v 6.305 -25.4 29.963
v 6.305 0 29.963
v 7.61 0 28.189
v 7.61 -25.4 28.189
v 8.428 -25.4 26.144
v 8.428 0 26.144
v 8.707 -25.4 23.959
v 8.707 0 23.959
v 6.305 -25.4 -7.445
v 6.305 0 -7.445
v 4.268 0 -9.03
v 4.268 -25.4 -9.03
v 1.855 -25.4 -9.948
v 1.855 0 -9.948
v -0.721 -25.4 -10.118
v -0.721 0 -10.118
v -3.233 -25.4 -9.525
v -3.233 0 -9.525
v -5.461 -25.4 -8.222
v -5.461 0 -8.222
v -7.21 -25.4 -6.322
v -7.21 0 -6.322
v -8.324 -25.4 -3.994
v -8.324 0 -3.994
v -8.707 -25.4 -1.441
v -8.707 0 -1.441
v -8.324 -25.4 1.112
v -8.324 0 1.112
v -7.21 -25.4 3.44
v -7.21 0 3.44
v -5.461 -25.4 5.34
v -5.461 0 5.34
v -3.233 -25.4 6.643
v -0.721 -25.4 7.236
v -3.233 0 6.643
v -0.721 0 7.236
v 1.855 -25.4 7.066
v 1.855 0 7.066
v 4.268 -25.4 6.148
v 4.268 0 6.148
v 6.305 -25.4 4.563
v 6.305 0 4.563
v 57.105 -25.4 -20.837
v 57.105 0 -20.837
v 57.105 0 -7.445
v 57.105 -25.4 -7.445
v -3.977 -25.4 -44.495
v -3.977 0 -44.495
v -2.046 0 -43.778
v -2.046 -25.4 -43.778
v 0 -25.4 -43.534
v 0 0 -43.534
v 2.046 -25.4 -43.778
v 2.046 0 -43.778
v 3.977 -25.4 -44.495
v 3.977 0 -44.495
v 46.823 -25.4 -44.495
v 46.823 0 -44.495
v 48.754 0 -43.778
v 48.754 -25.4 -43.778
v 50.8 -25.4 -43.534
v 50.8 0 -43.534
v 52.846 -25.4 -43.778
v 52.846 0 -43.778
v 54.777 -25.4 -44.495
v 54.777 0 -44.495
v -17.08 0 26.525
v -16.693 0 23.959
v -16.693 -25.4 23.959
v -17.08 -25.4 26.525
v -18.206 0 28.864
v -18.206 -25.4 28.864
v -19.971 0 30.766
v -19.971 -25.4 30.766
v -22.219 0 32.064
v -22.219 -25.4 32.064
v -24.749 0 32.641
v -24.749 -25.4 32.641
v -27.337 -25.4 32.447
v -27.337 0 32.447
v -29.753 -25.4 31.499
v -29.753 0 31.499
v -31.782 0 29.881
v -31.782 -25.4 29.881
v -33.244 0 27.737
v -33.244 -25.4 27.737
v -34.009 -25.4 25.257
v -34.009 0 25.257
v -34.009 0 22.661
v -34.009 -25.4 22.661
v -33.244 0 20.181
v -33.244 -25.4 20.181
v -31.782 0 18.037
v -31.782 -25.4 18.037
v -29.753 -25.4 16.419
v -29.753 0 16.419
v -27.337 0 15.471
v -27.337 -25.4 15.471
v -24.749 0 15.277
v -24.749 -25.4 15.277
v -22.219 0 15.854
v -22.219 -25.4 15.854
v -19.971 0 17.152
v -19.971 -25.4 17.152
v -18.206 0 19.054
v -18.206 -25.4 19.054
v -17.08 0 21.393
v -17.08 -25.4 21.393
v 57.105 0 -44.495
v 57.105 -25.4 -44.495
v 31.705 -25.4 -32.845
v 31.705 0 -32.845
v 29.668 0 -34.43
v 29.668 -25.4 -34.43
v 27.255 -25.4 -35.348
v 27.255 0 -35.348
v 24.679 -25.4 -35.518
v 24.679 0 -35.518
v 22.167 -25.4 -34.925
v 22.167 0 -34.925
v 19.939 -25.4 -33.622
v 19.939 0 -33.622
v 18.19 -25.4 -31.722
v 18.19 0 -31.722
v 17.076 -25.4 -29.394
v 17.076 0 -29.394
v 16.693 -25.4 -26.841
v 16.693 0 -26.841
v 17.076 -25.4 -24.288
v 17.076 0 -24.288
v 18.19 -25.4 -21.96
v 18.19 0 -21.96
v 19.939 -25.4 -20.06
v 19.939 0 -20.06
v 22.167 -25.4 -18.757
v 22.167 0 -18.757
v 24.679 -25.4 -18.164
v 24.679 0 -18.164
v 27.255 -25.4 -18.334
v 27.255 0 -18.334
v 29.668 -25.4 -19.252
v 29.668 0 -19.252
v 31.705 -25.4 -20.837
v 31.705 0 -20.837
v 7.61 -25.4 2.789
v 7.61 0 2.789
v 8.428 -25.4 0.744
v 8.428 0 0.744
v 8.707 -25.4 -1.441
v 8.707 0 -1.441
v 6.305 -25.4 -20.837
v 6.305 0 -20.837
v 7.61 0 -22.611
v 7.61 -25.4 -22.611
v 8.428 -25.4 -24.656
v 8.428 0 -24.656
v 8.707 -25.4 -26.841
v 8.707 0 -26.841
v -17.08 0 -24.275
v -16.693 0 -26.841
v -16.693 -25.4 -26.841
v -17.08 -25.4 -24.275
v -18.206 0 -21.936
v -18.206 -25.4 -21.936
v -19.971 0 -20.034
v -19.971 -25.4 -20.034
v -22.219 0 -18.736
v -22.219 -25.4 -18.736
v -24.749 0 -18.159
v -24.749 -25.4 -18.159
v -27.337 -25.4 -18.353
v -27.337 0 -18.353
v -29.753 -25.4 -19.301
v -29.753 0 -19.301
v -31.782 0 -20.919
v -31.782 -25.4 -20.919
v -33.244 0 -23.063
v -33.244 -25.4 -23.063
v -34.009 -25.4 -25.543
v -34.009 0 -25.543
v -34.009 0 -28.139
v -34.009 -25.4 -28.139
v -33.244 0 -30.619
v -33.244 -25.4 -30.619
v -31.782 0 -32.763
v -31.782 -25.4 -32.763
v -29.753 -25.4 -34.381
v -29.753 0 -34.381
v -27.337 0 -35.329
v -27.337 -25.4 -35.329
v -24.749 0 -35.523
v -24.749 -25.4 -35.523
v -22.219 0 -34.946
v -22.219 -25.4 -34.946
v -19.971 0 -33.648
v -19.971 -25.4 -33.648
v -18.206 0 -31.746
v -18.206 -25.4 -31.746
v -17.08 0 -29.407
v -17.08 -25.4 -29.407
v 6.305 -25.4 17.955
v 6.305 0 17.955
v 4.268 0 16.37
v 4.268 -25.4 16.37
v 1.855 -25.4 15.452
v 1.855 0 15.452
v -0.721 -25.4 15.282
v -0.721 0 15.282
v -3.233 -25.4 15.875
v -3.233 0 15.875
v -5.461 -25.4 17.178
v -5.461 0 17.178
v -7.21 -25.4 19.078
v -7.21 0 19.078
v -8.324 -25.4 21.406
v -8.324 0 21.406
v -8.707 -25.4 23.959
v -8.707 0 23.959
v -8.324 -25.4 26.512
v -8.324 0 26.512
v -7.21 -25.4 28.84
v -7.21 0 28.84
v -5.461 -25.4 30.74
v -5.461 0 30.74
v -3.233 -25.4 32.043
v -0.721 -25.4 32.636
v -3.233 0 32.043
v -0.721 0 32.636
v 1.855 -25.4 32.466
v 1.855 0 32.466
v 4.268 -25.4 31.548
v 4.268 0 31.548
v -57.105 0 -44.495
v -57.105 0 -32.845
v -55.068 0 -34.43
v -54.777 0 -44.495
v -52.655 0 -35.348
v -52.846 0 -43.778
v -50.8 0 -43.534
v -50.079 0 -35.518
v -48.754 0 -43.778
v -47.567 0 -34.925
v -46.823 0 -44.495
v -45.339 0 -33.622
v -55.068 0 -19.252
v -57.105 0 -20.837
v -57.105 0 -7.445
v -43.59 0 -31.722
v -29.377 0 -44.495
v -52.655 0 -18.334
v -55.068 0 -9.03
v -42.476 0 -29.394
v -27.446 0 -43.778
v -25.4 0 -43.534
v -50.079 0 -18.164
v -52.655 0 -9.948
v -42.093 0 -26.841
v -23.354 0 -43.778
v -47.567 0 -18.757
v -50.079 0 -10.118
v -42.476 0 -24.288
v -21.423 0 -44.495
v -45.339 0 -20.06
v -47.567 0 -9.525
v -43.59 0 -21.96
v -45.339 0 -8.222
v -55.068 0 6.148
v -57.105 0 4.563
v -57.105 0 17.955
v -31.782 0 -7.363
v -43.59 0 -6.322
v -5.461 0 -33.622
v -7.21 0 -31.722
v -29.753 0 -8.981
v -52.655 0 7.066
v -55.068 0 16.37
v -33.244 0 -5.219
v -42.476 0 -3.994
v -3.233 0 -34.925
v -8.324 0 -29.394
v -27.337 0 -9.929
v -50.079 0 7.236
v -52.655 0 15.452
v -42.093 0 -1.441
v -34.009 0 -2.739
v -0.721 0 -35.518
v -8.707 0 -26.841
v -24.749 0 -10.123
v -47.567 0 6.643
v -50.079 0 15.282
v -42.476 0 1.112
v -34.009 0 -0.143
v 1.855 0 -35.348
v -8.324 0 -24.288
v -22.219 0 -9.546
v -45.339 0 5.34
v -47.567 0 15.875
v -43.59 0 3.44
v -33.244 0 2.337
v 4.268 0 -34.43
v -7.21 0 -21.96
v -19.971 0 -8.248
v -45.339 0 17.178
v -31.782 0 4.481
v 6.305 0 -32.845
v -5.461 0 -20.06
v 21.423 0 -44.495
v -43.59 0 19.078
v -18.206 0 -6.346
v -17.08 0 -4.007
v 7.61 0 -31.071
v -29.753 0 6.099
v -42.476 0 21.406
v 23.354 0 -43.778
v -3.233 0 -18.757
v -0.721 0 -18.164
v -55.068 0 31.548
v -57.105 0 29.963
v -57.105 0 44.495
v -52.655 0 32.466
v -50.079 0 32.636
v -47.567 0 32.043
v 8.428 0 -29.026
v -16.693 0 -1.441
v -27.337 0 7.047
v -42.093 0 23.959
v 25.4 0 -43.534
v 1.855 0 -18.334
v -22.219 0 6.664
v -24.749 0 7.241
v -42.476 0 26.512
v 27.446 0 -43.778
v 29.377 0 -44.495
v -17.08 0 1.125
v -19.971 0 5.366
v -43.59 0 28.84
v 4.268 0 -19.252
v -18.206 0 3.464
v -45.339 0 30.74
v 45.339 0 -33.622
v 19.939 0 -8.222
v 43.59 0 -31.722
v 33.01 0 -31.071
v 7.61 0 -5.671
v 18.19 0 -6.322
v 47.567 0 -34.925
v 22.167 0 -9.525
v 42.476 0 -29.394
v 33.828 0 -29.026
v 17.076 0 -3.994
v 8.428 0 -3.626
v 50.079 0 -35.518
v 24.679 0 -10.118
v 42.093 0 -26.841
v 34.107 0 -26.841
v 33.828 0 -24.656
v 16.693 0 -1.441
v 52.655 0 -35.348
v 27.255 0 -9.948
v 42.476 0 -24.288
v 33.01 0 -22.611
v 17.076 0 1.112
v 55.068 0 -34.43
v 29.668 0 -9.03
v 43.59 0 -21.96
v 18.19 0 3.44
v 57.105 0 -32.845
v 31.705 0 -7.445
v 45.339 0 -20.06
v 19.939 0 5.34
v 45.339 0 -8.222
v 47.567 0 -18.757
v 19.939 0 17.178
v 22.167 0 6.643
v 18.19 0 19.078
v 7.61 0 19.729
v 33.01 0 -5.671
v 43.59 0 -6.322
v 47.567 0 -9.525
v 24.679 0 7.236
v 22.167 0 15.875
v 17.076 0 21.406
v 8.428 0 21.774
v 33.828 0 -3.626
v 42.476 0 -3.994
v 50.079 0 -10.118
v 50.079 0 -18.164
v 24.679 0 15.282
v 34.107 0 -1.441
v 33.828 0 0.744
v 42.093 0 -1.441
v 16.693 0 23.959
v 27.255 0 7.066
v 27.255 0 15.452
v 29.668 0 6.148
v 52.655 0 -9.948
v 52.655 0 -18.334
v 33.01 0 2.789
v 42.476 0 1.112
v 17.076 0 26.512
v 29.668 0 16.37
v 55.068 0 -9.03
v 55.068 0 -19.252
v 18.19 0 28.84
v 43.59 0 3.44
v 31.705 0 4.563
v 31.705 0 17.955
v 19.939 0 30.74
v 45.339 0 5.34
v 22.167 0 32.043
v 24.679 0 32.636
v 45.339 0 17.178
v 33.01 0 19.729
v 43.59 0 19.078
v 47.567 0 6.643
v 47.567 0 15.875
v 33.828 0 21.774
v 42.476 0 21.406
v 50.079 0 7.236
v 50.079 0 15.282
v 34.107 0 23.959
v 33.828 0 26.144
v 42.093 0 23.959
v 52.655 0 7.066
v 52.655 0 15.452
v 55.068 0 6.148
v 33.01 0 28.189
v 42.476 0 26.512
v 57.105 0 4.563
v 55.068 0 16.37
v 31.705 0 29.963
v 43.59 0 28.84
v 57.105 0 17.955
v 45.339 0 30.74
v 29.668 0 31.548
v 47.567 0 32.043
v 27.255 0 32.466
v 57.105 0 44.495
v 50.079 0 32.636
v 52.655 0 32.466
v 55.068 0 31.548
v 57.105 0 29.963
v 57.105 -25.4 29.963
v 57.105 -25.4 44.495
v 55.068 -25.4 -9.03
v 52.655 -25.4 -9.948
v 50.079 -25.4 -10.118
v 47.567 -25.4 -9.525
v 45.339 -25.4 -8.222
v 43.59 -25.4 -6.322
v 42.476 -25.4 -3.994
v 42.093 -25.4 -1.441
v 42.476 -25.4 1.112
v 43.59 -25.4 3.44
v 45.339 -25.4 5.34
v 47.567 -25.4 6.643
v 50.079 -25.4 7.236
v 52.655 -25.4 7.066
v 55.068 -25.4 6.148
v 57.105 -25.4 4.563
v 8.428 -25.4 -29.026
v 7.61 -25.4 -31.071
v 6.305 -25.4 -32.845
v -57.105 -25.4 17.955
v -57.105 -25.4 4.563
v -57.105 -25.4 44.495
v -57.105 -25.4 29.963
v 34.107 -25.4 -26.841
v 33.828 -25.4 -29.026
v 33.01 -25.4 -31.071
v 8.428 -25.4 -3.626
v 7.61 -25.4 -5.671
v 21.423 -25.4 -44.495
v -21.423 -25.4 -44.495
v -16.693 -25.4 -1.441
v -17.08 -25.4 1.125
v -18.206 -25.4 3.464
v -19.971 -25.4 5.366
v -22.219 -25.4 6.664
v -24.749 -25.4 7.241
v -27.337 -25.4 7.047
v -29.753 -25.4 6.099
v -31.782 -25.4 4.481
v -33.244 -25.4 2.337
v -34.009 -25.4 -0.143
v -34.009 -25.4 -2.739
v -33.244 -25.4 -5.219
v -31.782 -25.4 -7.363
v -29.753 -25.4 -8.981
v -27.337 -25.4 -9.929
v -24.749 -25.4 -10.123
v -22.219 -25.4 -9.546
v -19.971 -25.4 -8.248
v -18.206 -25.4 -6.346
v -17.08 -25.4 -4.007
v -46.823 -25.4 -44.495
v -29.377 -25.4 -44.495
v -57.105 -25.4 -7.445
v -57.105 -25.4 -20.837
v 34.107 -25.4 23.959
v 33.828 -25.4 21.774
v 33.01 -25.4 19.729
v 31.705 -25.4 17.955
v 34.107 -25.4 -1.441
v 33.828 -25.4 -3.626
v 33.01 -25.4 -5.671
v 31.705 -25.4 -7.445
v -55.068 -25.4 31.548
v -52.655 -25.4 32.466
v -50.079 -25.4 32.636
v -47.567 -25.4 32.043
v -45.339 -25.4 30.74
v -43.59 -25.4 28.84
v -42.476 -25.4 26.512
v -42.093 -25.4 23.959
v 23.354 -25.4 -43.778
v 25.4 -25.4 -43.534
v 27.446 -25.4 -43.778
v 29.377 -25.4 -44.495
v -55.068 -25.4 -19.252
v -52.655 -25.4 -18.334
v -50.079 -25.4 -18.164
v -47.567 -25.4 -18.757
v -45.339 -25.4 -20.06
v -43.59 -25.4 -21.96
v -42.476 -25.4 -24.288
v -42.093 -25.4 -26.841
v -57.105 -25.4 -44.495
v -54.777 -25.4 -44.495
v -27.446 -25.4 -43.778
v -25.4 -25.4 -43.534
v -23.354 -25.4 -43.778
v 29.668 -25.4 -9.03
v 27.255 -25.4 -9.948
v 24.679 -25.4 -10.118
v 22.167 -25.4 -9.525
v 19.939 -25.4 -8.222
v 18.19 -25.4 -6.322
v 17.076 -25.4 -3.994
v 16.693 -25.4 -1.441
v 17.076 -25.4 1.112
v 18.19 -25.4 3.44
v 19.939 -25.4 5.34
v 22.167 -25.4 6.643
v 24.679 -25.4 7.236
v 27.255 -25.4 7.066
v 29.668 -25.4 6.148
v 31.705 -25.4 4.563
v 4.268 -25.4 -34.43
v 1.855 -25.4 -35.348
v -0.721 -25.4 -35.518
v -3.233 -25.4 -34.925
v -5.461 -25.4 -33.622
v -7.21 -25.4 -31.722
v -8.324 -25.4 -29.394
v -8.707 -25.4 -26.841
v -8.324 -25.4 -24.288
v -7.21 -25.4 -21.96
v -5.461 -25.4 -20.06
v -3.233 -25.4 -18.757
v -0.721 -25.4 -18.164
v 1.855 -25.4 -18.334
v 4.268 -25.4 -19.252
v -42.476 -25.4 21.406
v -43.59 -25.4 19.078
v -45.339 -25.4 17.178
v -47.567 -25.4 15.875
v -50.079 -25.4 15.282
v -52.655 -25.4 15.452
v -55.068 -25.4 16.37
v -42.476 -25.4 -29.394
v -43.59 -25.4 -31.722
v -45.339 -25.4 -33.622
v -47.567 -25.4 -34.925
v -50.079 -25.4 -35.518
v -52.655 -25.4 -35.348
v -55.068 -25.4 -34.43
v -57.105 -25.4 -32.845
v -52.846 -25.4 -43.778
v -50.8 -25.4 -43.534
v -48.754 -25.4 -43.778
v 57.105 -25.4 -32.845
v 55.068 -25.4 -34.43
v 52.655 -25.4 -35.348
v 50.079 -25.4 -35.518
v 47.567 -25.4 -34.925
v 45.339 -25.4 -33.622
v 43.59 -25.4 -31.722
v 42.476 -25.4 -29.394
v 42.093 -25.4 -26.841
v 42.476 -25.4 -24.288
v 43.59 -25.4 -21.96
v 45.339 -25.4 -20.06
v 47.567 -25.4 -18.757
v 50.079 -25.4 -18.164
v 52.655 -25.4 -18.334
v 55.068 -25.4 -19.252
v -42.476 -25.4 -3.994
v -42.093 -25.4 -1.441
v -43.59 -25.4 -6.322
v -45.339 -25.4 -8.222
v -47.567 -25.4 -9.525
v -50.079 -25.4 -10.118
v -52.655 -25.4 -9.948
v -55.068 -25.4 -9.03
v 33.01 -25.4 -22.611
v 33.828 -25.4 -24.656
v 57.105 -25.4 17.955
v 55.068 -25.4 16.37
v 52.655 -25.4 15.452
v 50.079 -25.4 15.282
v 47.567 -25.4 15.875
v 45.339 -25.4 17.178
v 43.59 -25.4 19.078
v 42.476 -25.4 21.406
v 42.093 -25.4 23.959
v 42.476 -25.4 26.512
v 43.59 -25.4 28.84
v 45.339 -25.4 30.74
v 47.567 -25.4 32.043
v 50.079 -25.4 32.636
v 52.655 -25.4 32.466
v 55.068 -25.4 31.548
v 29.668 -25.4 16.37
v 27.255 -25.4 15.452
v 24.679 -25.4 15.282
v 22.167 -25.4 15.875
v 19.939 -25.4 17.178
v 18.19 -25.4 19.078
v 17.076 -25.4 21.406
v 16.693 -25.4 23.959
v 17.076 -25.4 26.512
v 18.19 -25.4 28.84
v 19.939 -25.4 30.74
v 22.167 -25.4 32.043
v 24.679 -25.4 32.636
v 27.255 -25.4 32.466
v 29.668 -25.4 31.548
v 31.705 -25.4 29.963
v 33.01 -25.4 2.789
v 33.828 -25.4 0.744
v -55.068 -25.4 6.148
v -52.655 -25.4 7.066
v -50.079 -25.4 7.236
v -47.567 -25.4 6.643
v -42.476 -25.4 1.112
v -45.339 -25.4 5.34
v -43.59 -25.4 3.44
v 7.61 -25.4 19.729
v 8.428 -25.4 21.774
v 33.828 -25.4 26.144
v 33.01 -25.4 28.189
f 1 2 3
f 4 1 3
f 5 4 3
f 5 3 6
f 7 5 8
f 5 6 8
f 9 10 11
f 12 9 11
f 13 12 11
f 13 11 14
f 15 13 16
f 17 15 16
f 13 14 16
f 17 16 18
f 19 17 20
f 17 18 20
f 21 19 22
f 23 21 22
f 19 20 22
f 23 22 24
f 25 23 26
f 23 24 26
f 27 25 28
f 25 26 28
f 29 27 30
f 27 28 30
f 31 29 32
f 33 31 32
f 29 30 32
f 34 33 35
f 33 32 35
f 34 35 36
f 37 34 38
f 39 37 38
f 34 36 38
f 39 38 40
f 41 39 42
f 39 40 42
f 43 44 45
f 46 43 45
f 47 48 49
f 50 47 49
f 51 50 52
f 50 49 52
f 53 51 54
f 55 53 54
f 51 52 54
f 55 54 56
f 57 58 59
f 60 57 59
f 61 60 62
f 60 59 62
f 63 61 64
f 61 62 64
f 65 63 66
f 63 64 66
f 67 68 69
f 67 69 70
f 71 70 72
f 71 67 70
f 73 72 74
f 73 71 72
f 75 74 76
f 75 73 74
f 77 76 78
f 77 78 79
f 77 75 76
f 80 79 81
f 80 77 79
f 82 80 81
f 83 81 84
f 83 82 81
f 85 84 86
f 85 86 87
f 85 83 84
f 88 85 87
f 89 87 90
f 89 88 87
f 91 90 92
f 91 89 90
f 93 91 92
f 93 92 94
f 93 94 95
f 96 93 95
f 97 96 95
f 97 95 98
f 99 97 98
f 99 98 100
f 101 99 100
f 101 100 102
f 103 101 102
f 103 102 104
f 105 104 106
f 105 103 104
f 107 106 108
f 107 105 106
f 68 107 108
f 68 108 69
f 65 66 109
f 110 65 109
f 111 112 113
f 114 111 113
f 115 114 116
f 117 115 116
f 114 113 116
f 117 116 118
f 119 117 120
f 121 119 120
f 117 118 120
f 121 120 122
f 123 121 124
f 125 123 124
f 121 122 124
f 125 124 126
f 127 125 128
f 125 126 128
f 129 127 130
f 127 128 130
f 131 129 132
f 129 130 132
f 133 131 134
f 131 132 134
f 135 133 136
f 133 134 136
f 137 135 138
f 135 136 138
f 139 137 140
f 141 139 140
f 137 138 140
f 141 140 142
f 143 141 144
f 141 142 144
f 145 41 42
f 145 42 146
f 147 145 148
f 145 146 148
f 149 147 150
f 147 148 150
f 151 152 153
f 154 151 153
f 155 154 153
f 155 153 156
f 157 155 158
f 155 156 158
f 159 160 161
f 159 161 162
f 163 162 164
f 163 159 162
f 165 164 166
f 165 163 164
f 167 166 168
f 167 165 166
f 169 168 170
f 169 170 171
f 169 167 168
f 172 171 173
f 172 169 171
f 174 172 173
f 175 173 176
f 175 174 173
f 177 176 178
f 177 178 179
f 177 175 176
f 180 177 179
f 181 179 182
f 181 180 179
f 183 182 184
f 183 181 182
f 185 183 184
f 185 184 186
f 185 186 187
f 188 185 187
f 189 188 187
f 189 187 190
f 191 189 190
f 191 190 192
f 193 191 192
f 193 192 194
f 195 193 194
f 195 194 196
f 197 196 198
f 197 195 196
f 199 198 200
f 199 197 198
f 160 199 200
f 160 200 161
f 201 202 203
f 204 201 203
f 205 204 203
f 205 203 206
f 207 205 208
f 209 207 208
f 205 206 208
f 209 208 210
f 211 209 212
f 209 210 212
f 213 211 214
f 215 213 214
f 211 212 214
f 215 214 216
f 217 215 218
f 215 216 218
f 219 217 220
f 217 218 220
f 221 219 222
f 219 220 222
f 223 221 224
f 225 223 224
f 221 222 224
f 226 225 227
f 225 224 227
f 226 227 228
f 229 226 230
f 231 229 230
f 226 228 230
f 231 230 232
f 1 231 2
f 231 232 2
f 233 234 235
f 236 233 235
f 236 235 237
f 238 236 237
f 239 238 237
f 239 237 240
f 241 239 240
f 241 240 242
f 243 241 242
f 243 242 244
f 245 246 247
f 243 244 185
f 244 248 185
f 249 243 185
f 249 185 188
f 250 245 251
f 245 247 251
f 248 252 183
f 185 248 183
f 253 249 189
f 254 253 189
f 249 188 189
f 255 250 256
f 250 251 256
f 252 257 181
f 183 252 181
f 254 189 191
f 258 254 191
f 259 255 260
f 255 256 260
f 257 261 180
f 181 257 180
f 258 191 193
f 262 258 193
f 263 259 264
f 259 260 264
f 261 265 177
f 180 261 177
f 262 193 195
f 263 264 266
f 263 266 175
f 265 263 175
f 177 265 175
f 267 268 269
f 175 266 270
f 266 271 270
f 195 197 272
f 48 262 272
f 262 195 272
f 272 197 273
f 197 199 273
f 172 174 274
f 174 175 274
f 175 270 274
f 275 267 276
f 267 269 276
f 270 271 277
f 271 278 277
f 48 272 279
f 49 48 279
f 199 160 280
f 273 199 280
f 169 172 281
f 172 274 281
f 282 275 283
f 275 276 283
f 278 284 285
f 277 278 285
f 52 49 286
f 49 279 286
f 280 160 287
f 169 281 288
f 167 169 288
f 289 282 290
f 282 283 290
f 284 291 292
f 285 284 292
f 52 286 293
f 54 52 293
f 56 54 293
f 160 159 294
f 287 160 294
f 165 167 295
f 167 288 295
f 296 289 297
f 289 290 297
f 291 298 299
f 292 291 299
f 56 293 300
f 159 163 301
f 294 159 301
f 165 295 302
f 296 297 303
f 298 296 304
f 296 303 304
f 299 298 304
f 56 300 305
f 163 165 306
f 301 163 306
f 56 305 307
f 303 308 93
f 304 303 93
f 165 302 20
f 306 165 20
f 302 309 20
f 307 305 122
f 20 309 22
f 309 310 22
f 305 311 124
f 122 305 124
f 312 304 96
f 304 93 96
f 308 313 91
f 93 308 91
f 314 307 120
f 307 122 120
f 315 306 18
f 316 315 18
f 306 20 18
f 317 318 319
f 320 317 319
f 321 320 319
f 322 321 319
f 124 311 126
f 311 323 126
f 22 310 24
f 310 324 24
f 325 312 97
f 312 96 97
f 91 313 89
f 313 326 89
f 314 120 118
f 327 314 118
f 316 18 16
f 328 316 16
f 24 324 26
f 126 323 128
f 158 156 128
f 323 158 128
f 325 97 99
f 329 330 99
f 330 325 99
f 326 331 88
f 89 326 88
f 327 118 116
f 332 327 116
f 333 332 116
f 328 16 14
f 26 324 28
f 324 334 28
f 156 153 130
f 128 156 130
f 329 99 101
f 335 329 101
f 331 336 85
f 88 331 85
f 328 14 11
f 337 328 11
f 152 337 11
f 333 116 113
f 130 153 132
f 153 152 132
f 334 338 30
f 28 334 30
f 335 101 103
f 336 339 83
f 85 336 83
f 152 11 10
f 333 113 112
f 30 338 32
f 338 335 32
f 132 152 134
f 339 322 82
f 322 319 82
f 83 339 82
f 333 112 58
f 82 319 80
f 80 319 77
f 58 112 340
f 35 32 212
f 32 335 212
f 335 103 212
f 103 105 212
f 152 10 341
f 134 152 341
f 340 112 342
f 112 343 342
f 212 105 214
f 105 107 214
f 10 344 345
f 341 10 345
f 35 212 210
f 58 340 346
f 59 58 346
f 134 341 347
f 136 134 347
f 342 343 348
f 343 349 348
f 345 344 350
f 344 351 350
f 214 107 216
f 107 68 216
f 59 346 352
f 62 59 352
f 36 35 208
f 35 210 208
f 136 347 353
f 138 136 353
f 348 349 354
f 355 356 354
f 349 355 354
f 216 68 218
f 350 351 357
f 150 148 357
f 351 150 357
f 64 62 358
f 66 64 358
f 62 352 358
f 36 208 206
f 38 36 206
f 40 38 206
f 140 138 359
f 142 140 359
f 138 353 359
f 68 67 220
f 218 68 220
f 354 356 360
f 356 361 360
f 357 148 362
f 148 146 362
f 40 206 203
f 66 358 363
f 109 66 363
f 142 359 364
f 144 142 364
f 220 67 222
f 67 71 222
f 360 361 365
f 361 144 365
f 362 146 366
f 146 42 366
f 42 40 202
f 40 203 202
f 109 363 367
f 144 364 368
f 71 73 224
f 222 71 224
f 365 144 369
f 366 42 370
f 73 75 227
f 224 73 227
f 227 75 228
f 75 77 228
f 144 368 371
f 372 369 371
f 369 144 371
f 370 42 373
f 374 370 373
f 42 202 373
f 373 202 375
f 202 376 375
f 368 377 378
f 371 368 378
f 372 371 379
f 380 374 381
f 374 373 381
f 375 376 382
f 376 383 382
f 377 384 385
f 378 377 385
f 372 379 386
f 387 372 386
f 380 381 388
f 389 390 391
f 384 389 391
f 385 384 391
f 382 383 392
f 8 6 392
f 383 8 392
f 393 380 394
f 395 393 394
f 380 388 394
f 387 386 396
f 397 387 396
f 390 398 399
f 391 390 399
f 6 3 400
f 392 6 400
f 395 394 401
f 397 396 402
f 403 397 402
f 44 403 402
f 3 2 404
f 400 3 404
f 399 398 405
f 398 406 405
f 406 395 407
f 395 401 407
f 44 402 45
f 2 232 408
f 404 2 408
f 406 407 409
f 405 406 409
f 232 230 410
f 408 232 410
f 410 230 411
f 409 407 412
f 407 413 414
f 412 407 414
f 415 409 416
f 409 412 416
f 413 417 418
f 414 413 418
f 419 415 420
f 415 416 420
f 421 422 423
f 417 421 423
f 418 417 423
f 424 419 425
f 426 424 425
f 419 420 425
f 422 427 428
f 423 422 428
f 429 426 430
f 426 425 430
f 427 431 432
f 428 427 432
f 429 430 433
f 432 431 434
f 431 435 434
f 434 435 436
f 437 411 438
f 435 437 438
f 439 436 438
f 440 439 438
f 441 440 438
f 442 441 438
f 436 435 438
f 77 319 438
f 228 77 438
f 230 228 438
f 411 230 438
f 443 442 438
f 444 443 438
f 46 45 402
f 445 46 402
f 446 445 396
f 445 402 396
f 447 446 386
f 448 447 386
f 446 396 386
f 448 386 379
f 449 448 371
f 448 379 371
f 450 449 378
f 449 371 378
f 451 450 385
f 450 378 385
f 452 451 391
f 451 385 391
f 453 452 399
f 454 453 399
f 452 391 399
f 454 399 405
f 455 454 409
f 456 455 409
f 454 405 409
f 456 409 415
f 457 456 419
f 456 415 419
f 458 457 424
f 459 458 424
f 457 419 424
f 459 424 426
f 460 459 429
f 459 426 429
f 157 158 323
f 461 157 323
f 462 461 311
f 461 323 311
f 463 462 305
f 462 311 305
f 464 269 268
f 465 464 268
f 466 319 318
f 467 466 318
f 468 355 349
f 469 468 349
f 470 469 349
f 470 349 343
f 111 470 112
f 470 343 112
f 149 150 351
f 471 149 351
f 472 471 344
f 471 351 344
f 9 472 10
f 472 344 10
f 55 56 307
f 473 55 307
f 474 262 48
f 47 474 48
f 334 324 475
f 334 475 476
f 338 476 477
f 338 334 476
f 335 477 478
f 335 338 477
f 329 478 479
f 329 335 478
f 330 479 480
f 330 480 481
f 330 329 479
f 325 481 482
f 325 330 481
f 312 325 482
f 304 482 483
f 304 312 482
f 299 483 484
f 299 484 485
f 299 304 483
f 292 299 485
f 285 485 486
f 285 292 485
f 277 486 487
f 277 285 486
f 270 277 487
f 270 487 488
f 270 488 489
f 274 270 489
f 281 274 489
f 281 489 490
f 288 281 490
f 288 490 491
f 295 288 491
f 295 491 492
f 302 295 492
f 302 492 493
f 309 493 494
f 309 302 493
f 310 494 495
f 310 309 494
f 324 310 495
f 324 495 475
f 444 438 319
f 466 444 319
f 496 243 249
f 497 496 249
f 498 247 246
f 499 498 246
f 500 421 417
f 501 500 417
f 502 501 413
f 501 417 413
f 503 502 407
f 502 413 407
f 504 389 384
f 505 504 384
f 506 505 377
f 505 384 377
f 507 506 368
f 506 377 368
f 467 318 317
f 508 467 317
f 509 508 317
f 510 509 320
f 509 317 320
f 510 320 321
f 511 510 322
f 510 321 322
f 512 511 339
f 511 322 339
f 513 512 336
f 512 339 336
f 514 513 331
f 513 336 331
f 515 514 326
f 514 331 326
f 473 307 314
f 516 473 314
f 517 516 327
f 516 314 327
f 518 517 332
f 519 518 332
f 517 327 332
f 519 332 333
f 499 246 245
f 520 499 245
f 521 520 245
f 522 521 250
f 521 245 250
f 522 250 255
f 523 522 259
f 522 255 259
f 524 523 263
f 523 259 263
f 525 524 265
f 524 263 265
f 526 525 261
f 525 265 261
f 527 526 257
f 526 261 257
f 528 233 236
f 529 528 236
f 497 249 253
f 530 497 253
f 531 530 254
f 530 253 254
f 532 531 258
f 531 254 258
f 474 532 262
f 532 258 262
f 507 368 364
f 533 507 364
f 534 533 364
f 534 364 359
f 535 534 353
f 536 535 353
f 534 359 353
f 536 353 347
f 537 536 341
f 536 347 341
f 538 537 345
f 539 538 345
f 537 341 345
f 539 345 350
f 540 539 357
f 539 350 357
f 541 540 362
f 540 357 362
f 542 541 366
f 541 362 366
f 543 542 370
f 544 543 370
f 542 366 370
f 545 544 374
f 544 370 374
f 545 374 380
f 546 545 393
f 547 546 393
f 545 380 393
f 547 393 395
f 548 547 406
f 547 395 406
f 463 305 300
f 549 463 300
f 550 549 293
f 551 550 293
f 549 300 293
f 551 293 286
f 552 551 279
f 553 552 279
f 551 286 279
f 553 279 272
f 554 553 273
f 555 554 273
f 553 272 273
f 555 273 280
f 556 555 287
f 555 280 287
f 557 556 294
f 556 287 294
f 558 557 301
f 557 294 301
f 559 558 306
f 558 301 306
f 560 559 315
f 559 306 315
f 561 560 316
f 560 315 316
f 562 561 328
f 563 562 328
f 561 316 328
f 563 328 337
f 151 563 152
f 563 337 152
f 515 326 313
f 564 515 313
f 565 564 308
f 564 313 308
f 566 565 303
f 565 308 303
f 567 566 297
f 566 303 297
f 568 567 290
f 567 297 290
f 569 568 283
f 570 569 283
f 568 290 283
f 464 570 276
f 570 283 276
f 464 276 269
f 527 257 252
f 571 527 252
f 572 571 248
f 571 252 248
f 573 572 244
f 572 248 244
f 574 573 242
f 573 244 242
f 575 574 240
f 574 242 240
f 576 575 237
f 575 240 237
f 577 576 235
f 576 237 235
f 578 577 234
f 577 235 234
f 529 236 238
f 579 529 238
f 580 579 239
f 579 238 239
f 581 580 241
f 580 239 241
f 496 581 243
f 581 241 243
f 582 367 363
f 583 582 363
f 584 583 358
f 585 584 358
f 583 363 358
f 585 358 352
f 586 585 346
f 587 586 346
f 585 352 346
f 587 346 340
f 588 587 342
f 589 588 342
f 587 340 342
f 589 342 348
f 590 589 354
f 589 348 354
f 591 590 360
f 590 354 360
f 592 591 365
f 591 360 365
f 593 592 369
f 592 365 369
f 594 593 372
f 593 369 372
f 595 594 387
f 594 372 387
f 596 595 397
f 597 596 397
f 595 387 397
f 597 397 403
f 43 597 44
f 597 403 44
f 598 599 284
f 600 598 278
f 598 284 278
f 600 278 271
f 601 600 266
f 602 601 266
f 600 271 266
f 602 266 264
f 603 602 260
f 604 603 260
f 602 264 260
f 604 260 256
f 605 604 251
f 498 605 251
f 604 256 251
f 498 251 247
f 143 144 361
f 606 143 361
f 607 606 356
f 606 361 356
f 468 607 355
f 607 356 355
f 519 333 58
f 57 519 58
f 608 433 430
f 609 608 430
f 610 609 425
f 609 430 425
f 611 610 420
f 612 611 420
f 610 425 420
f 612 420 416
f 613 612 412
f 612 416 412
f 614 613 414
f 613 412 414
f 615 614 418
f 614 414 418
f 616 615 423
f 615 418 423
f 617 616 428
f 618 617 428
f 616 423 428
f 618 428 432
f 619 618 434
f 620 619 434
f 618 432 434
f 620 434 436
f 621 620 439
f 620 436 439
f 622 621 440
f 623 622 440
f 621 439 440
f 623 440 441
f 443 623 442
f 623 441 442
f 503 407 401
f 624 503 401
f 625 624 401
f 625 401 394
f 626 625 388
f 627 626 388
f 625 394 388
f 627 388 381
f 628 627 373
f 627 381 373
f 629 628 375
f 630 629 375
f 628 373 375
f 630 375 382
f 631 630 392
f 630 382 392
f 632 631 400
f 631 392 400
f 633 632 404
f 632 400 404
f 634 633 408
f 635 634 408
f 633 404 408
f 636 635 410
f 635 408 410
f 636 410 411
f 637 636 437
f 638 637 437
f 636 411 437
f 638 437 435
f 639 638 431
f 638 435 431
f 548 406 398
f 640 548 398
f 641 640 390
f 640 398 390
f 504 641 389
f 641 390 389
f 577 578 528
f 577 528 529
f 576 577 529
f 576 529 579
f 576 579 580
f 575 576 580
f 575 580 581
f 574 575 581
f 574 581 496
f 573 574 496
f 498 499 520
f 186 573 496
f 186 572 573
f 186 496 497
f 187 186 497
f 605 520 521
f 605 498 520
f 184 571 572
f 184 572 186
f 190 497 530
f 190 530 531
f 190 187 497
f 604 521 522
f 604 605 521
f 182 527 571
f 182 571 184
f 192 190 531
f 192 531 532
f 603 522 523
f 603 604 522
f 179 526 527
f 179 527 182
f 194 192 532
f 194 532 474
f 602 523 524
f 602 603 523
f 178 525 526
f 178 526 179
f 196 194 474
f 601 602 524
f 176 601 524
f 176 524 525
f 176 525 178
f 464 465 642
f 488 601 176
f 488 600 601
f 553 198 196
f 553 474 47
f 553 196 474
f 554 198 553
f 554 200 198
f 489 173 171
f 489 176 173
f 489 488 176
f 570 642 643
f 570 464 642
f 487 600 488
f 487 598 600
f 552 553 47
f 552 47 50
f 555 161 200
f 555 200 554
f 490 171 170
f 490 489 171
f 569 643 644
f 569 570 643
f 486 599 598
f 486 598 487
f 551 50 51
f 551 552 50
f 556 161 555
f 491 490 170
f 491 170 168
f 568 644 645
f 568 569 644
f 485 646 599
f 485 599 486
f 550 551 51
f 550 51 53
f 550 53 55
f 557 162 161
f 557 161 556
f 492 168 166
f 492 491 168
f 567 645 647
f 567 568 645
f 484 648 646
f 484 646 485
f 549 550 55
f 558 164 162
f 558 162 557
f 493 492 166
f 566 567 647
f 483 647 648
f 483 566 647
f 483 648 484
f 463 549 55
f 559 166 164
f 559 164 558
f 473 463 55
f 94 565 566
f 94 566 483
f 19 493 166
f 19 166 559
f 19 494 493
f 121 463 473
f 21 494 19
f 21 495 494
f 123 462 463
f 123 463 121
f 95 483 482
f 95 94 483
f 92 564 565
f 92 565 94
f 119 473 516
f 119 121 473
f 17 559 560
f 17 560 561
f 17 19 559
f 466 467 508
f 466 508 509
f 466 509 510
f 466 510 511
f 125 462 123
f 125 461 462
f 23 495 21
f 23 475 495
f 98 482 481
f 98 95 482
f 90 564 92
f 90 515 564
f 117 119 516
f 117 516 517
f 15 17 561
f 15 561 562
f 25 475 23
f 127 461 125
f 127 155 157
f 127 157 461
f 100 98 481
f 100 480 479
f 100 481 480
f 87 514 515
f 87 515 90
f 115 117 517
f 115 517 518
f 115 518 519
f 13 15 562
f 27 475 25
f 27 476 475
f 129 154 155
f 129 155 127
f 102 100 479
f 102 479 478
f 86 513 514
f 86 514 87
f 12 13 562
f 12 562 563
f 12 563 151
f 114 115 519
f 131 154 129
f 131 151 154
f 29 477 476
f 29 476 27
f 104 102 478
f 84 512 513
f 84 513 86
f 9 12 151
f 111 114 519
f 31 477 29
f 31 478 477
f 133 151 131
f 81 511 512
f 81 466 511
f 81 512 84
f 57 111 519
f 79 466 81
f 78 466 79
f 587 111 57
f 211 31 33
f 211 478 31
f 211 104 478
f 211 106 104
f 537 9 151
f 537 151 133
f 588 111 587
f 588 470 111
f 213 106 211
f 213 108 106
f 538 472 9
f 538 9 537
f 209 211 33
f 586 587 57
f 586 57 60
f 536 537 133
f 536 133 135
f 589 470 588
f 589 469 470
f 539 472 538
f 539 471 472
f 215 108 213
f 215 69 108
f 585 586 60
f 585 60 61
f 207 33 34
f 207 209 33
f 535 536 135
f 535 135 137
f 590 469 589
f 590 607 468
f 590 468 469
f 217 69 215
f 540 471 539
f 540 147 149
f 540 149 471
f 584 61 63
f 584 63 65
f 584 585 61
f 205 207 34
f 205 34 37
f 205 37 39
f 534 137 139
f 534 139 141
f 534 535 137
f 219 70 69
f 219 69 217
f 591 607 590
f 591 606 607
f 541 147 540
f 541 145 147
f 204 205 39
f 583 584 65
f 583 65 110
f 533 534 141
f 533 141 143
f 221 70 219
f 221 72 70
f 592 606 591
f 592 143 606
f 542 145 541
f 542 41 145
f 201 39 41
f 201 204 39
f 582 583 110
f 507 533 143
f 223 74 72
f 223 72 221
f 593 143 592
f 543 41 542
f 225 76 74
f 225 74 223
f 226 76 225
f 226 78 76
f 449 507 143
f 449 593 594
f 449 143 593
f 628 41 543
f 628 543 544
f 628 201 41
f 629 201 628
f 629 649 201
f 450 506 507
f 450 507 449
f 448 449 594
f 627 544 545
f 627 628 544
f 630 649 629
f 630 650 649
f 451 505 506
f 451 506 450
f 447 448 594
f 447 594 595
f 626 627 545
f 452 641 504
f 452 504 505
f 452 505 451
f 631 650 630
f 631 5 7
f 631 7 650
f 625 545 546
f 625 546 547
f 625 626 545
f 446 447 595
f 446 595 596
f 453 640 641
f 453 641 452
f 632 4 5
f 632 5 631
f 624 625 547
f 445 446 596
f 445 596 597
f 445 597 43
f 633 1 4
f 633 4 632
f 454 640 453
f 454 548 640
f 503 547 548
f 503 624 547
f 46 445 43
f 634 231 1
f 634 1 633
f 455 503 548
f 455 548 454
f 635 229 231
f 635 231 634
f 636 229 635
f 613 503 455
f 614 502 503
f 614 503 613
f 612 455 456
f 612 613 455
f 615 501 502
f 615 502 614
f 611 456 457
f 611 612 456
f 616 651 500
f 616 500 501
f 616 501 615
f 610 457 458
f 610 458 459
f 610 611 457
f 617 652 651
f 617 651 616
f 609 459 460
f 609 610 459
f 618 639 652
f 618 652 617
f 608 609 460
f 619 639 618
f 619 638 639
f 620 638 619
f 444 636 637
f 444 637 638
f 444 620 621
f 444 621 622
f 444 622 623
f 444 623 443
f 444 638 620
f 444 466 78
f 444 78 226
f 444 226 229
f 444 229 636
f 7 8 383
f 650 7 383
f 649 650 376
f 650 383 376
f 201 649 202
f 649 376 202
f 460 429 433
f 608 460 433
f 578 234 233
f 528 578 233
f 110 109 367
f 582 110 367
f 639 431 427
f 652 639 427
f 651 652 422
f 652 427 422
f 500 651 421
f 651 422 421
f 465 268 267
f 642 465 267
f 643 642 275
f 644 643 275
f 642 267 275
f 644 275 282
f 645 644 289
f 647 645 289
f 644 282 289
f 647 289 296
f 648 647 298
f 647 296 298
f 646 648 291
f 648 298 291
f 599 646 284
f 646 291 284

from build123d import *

# Parameters (mm, degrees)
F0_R     = 8.7067179479
F1_DEPTH = 25.4


with BuildPart() as f1:
    # F0 (on Front) → F1 (new body)
    with BuildSketch(Plane.XZ):
        with BuildLine():
            Line((57.1053996682, 29.9631231404), (57.1053996682, 44.4953776896))
            Line((57.1053996682, 44.4953776896), (31.7053996682, 44.4953776896))
            Line((31.7053996682, 44.4953776896), (31.7053996682, 29.9631231404))
            ThreePointArc((31.7053996682, 29.9631231404), (33.4841287064, 27.1922855677), (34.1067179479, 23.9590518177))
            ThreePointArc((34.1067179479, 23.9590518177), (33.4841287064, 20.7258180677), (31.7053996682, 17.9549804949))
            Line((31.7053996682, 17.9549804949), (31.7053996682, 4.5631231404))
            ThreePointArc((31.7053996682, 4.5631231404), (33.4841287064, 1.7922855677), (34.1067179479, -1.4409481823))
            ThreePointArc((34.1067179479, -1.4409481823), (33.4841287064, -4.6741819323), (31.7053996682, -7.4450195051))
            Line((31.7053996682, -7.4450195051), (31.7053996682, -20.8368768596))
            ThreePointArc((31.7053996682, -20.8368768596), (33.4841287064, -23.6077144323), (34.1067179479, -26.8409481823))
            ThreePointArc((34.1067179479, -26.8409481823), (33.4841287064, -30.0741819323), (31.7053996682, -32.8450195051))
            Line((31.7053996682, -32.8450195051), (31.7053996682, -44.4953776896))
            Line((31.7053996682, -44.4953776896), (46.8234342497, -44.4953776896))
            ThreePointArc((46.8234342497, -44.4953776896), (50.8, -43.5342302345), (54.7765657503, -44.4953776896))
            Line((54.7765657503, -44.4953776896), (57.1053996682, -44.4953776896))
            Line((57.1053996682, -44.4953776896), (57.1053996682, -32.8450195051))
            ThreePointArc((57.1053996682, -32.8450195051), (42.0932820521, -26.8409481823), (57.1053996682, -20.8368768596))
            Line((57.1053996682, -20.8368768596), (57.1053996682, -7.4450195051))
            ThreePointArc((57.1053996682, -7.4450195051), (42.0932820521, -1.4409481823), (57.1053996682, 4.5631231404))
            Line((57.1053996682, 4.5631231404), (57.1053996682, 17.9549804949))
            ThreePointArc((57.1053996682, 17.9549804949), (42.0932820521, 23.9590518177), (57.1053996682, 29.9631231404))
        make_face()
        with BuildLine():
            Line((31.7053996682, 29.9631231404), (31.7053996682, 44.4953776896))
            Line((31.7053996682, 44.4953776896), (6.3053996682, 44.4953776896))
            Line((6.3053996682, 44.4953776896), (6.3053996682, 29.9631231404))
            ThreePointArc((6.3053996682, 29.9631231404), (8.0841287064, 27.1922855677), (8.7067179479, 23.9590518177))
            ThreePointArc((8.7067179479, 23.9590518177), (8.0841287064, 20.7258180677), (6.3053996682, 17.9549804949))
            Line((6.3053996682, 17.9549804949), (6.3053996682, 4.5631231404))
            ThreePointArc((6.3053996682, 4.5631231404), (8.0841287064, 1.7922855677), (8.7067179479, -1.4409481823))
            ThreePointArc((8.7067179479, -1.4409481823), (8.0841287064, -4.6741819323), (6.3053996682, -7.4450195051))
            Line((6.3053996682, -7.4450195051), (6.3053996682, -20.8368768596))
            ThreePointArc((6.3053996682, -20.8368768596), (8.0841287064, -23.6077144323), (8.7067179479, -26.8409481823))
            ThreePointArc((8.7067179479, -26.8409481823), (8.0841287064, -30.0741819323), (6.3053996682, -32.8450195051))
            Line((6.3053996682, -32.8450195051), (6.3053996682, -44.4953776896))
            Line((6.3053996682, -44.4953776896), (21.4234342497, -44.4953776896))
            ThreePointArc((21.4234342497, -44.4953776896), (25.4, -43.5342302345), (29.3765657503, -44.4953776896))
            Line((29.3765657503, -44.4953776896), (31.7053996682, -44.4953776896))
            Line((31.7053996682, -44.4953776896), (31.7053996682, -32.8450195051))
            ThreePointArc((31.7053996682, -32.8450195051), (16.6932820521, -26.8409481823), (31.7053996682, -20.8368768596))
            Line((31.7053996682, -20.8368768596), (31.7053996682, -7.4450195051))
            ThreePointArc((31.7053996682, -7.4450195051), (16.6932820521, -1.4409481823), (31.7053996682, 4.5631231404))
            Line((31.7053996682, 4.5631231404), (31.7053996682, 17.9549804949))
            ThreePointArc((31.7053996682, 17.9549804949), (16.6932820521, 23.9590518177), (31.7053996682, 29.9631231404))
        make_face()
        with BuildLine():
            Line((6.3053996682, 29.9631231404), (6.3053996682, 44.4953776896))
            Line((6.3053996682, 44.4953776896), (-57.1053996682, 44.4953776896))
            Line((-57.1053996682, 44.4953776896), (-57.1053996682, 29.9631231404))
            ThreePointArc((-57.1053996682, 29.9631231404), (-47.56676625, 32.0431805241), (-42.0932820521, 23.9590518177))
            ThreePointArc((-42.0932820521, 23.9590518177), (-47.56676625, 15.8749231112), (-57.1053996682, 17.9549804949))
            Line((-57.1053996682, 17.9549804949), (-57.1053996682, 4.5631231404))
            ThreePointArc((-57.1053996682, 4.5631231404), (-47.56676625, 6.6431805241), (-42.0932820521, -1.4409481823))
            ThreePointArc((-42.0932820521, -1.4409481823), (-47.56676625, -9.5250768888), (-57.1053996682, -7.4450195051))
            Line((-57.1053996682, -7.4450195051), (-57.1053996682, -20.8368768596))
            ThreePointArc((-57.1053996682, -20.8368768596), (-47.56676625, -18.7568194759), (-42.0932820521, -26.8409481823))
            ThreePointArc((-42.0932820521, -26.8409481823), (-47.56676625, -34.9250768888), (-57.1053996682, -32.8450195051))
            Line((-57.1053996682, -32.8450195051), (-57.1053996682, -44.4953776896))
            Line((-57.1053996682, -44.4953776896), (-54.7765657503, -44.4953776896))
            ThreePointArc((-54.7765657503, -44.4953776896), (-50.8, -43.5342302345), (-46.8234342497, -44.4953776896))
            Line((-46.8234342497, -44.4953776896), (-29.3765657503, -44.4953776896))
            ThreePointArc((-29.3765657503, -44.4953776896), (-25.4, -43.5342302345), (-21.4234342497, -44.4953776896))
            Line((-21.4234342497, -44.4953776896), (-3.9765657503, -44.4953776896))
            ThreePointArc((-3.9765657503, -44.4953776896), (0, -43.5342302345), (3.9765657503, -44.4953776896))
            Line((3.9765657503, -44.4953776896), (6.3053996682, -44.4953776896))
            Line((6.3053996682, -44.4953776896), (6.3053996682, -32.8450195051))
            ThreePointArc((6.3053996682, -32.8450195051), (-8.7067179479, -26.8409481823), (6.3053996682, -20.8368768596))
            Line((6.3053996682, -20.8368768596), (6.3053996682, -7.4450195051))
            ThreePointArc((6.3053996682, -7.4450195051), (-8.7067179479, -1.4409481823), (6.3053996682, 4.5631231404))
            Line((6.3053996682, 4.5631231404), (6.3053996682, 17.9549804949))
            ThreePointArc((6.3053996682, 17.9549804949), (-8.7067179479, 23.9590518177), (6.3053996682, 29.9631231404))
        make_face()
        with Locations((-25.4, -26.8409481823)):
            Circle(F0_R, mode=Mode.SUBTRACT)
        with Locations((-25.4, -1.4409481823)):
            Circle(F0_R, mode=Mode.SUBTRACT)
        with Locations((-25.4, 23.9590518177)):
            Circle(F0_R, mode=Mode.SUBTRACT)
    extrude(amount=F1_DEPTH)


solid = f1.part
